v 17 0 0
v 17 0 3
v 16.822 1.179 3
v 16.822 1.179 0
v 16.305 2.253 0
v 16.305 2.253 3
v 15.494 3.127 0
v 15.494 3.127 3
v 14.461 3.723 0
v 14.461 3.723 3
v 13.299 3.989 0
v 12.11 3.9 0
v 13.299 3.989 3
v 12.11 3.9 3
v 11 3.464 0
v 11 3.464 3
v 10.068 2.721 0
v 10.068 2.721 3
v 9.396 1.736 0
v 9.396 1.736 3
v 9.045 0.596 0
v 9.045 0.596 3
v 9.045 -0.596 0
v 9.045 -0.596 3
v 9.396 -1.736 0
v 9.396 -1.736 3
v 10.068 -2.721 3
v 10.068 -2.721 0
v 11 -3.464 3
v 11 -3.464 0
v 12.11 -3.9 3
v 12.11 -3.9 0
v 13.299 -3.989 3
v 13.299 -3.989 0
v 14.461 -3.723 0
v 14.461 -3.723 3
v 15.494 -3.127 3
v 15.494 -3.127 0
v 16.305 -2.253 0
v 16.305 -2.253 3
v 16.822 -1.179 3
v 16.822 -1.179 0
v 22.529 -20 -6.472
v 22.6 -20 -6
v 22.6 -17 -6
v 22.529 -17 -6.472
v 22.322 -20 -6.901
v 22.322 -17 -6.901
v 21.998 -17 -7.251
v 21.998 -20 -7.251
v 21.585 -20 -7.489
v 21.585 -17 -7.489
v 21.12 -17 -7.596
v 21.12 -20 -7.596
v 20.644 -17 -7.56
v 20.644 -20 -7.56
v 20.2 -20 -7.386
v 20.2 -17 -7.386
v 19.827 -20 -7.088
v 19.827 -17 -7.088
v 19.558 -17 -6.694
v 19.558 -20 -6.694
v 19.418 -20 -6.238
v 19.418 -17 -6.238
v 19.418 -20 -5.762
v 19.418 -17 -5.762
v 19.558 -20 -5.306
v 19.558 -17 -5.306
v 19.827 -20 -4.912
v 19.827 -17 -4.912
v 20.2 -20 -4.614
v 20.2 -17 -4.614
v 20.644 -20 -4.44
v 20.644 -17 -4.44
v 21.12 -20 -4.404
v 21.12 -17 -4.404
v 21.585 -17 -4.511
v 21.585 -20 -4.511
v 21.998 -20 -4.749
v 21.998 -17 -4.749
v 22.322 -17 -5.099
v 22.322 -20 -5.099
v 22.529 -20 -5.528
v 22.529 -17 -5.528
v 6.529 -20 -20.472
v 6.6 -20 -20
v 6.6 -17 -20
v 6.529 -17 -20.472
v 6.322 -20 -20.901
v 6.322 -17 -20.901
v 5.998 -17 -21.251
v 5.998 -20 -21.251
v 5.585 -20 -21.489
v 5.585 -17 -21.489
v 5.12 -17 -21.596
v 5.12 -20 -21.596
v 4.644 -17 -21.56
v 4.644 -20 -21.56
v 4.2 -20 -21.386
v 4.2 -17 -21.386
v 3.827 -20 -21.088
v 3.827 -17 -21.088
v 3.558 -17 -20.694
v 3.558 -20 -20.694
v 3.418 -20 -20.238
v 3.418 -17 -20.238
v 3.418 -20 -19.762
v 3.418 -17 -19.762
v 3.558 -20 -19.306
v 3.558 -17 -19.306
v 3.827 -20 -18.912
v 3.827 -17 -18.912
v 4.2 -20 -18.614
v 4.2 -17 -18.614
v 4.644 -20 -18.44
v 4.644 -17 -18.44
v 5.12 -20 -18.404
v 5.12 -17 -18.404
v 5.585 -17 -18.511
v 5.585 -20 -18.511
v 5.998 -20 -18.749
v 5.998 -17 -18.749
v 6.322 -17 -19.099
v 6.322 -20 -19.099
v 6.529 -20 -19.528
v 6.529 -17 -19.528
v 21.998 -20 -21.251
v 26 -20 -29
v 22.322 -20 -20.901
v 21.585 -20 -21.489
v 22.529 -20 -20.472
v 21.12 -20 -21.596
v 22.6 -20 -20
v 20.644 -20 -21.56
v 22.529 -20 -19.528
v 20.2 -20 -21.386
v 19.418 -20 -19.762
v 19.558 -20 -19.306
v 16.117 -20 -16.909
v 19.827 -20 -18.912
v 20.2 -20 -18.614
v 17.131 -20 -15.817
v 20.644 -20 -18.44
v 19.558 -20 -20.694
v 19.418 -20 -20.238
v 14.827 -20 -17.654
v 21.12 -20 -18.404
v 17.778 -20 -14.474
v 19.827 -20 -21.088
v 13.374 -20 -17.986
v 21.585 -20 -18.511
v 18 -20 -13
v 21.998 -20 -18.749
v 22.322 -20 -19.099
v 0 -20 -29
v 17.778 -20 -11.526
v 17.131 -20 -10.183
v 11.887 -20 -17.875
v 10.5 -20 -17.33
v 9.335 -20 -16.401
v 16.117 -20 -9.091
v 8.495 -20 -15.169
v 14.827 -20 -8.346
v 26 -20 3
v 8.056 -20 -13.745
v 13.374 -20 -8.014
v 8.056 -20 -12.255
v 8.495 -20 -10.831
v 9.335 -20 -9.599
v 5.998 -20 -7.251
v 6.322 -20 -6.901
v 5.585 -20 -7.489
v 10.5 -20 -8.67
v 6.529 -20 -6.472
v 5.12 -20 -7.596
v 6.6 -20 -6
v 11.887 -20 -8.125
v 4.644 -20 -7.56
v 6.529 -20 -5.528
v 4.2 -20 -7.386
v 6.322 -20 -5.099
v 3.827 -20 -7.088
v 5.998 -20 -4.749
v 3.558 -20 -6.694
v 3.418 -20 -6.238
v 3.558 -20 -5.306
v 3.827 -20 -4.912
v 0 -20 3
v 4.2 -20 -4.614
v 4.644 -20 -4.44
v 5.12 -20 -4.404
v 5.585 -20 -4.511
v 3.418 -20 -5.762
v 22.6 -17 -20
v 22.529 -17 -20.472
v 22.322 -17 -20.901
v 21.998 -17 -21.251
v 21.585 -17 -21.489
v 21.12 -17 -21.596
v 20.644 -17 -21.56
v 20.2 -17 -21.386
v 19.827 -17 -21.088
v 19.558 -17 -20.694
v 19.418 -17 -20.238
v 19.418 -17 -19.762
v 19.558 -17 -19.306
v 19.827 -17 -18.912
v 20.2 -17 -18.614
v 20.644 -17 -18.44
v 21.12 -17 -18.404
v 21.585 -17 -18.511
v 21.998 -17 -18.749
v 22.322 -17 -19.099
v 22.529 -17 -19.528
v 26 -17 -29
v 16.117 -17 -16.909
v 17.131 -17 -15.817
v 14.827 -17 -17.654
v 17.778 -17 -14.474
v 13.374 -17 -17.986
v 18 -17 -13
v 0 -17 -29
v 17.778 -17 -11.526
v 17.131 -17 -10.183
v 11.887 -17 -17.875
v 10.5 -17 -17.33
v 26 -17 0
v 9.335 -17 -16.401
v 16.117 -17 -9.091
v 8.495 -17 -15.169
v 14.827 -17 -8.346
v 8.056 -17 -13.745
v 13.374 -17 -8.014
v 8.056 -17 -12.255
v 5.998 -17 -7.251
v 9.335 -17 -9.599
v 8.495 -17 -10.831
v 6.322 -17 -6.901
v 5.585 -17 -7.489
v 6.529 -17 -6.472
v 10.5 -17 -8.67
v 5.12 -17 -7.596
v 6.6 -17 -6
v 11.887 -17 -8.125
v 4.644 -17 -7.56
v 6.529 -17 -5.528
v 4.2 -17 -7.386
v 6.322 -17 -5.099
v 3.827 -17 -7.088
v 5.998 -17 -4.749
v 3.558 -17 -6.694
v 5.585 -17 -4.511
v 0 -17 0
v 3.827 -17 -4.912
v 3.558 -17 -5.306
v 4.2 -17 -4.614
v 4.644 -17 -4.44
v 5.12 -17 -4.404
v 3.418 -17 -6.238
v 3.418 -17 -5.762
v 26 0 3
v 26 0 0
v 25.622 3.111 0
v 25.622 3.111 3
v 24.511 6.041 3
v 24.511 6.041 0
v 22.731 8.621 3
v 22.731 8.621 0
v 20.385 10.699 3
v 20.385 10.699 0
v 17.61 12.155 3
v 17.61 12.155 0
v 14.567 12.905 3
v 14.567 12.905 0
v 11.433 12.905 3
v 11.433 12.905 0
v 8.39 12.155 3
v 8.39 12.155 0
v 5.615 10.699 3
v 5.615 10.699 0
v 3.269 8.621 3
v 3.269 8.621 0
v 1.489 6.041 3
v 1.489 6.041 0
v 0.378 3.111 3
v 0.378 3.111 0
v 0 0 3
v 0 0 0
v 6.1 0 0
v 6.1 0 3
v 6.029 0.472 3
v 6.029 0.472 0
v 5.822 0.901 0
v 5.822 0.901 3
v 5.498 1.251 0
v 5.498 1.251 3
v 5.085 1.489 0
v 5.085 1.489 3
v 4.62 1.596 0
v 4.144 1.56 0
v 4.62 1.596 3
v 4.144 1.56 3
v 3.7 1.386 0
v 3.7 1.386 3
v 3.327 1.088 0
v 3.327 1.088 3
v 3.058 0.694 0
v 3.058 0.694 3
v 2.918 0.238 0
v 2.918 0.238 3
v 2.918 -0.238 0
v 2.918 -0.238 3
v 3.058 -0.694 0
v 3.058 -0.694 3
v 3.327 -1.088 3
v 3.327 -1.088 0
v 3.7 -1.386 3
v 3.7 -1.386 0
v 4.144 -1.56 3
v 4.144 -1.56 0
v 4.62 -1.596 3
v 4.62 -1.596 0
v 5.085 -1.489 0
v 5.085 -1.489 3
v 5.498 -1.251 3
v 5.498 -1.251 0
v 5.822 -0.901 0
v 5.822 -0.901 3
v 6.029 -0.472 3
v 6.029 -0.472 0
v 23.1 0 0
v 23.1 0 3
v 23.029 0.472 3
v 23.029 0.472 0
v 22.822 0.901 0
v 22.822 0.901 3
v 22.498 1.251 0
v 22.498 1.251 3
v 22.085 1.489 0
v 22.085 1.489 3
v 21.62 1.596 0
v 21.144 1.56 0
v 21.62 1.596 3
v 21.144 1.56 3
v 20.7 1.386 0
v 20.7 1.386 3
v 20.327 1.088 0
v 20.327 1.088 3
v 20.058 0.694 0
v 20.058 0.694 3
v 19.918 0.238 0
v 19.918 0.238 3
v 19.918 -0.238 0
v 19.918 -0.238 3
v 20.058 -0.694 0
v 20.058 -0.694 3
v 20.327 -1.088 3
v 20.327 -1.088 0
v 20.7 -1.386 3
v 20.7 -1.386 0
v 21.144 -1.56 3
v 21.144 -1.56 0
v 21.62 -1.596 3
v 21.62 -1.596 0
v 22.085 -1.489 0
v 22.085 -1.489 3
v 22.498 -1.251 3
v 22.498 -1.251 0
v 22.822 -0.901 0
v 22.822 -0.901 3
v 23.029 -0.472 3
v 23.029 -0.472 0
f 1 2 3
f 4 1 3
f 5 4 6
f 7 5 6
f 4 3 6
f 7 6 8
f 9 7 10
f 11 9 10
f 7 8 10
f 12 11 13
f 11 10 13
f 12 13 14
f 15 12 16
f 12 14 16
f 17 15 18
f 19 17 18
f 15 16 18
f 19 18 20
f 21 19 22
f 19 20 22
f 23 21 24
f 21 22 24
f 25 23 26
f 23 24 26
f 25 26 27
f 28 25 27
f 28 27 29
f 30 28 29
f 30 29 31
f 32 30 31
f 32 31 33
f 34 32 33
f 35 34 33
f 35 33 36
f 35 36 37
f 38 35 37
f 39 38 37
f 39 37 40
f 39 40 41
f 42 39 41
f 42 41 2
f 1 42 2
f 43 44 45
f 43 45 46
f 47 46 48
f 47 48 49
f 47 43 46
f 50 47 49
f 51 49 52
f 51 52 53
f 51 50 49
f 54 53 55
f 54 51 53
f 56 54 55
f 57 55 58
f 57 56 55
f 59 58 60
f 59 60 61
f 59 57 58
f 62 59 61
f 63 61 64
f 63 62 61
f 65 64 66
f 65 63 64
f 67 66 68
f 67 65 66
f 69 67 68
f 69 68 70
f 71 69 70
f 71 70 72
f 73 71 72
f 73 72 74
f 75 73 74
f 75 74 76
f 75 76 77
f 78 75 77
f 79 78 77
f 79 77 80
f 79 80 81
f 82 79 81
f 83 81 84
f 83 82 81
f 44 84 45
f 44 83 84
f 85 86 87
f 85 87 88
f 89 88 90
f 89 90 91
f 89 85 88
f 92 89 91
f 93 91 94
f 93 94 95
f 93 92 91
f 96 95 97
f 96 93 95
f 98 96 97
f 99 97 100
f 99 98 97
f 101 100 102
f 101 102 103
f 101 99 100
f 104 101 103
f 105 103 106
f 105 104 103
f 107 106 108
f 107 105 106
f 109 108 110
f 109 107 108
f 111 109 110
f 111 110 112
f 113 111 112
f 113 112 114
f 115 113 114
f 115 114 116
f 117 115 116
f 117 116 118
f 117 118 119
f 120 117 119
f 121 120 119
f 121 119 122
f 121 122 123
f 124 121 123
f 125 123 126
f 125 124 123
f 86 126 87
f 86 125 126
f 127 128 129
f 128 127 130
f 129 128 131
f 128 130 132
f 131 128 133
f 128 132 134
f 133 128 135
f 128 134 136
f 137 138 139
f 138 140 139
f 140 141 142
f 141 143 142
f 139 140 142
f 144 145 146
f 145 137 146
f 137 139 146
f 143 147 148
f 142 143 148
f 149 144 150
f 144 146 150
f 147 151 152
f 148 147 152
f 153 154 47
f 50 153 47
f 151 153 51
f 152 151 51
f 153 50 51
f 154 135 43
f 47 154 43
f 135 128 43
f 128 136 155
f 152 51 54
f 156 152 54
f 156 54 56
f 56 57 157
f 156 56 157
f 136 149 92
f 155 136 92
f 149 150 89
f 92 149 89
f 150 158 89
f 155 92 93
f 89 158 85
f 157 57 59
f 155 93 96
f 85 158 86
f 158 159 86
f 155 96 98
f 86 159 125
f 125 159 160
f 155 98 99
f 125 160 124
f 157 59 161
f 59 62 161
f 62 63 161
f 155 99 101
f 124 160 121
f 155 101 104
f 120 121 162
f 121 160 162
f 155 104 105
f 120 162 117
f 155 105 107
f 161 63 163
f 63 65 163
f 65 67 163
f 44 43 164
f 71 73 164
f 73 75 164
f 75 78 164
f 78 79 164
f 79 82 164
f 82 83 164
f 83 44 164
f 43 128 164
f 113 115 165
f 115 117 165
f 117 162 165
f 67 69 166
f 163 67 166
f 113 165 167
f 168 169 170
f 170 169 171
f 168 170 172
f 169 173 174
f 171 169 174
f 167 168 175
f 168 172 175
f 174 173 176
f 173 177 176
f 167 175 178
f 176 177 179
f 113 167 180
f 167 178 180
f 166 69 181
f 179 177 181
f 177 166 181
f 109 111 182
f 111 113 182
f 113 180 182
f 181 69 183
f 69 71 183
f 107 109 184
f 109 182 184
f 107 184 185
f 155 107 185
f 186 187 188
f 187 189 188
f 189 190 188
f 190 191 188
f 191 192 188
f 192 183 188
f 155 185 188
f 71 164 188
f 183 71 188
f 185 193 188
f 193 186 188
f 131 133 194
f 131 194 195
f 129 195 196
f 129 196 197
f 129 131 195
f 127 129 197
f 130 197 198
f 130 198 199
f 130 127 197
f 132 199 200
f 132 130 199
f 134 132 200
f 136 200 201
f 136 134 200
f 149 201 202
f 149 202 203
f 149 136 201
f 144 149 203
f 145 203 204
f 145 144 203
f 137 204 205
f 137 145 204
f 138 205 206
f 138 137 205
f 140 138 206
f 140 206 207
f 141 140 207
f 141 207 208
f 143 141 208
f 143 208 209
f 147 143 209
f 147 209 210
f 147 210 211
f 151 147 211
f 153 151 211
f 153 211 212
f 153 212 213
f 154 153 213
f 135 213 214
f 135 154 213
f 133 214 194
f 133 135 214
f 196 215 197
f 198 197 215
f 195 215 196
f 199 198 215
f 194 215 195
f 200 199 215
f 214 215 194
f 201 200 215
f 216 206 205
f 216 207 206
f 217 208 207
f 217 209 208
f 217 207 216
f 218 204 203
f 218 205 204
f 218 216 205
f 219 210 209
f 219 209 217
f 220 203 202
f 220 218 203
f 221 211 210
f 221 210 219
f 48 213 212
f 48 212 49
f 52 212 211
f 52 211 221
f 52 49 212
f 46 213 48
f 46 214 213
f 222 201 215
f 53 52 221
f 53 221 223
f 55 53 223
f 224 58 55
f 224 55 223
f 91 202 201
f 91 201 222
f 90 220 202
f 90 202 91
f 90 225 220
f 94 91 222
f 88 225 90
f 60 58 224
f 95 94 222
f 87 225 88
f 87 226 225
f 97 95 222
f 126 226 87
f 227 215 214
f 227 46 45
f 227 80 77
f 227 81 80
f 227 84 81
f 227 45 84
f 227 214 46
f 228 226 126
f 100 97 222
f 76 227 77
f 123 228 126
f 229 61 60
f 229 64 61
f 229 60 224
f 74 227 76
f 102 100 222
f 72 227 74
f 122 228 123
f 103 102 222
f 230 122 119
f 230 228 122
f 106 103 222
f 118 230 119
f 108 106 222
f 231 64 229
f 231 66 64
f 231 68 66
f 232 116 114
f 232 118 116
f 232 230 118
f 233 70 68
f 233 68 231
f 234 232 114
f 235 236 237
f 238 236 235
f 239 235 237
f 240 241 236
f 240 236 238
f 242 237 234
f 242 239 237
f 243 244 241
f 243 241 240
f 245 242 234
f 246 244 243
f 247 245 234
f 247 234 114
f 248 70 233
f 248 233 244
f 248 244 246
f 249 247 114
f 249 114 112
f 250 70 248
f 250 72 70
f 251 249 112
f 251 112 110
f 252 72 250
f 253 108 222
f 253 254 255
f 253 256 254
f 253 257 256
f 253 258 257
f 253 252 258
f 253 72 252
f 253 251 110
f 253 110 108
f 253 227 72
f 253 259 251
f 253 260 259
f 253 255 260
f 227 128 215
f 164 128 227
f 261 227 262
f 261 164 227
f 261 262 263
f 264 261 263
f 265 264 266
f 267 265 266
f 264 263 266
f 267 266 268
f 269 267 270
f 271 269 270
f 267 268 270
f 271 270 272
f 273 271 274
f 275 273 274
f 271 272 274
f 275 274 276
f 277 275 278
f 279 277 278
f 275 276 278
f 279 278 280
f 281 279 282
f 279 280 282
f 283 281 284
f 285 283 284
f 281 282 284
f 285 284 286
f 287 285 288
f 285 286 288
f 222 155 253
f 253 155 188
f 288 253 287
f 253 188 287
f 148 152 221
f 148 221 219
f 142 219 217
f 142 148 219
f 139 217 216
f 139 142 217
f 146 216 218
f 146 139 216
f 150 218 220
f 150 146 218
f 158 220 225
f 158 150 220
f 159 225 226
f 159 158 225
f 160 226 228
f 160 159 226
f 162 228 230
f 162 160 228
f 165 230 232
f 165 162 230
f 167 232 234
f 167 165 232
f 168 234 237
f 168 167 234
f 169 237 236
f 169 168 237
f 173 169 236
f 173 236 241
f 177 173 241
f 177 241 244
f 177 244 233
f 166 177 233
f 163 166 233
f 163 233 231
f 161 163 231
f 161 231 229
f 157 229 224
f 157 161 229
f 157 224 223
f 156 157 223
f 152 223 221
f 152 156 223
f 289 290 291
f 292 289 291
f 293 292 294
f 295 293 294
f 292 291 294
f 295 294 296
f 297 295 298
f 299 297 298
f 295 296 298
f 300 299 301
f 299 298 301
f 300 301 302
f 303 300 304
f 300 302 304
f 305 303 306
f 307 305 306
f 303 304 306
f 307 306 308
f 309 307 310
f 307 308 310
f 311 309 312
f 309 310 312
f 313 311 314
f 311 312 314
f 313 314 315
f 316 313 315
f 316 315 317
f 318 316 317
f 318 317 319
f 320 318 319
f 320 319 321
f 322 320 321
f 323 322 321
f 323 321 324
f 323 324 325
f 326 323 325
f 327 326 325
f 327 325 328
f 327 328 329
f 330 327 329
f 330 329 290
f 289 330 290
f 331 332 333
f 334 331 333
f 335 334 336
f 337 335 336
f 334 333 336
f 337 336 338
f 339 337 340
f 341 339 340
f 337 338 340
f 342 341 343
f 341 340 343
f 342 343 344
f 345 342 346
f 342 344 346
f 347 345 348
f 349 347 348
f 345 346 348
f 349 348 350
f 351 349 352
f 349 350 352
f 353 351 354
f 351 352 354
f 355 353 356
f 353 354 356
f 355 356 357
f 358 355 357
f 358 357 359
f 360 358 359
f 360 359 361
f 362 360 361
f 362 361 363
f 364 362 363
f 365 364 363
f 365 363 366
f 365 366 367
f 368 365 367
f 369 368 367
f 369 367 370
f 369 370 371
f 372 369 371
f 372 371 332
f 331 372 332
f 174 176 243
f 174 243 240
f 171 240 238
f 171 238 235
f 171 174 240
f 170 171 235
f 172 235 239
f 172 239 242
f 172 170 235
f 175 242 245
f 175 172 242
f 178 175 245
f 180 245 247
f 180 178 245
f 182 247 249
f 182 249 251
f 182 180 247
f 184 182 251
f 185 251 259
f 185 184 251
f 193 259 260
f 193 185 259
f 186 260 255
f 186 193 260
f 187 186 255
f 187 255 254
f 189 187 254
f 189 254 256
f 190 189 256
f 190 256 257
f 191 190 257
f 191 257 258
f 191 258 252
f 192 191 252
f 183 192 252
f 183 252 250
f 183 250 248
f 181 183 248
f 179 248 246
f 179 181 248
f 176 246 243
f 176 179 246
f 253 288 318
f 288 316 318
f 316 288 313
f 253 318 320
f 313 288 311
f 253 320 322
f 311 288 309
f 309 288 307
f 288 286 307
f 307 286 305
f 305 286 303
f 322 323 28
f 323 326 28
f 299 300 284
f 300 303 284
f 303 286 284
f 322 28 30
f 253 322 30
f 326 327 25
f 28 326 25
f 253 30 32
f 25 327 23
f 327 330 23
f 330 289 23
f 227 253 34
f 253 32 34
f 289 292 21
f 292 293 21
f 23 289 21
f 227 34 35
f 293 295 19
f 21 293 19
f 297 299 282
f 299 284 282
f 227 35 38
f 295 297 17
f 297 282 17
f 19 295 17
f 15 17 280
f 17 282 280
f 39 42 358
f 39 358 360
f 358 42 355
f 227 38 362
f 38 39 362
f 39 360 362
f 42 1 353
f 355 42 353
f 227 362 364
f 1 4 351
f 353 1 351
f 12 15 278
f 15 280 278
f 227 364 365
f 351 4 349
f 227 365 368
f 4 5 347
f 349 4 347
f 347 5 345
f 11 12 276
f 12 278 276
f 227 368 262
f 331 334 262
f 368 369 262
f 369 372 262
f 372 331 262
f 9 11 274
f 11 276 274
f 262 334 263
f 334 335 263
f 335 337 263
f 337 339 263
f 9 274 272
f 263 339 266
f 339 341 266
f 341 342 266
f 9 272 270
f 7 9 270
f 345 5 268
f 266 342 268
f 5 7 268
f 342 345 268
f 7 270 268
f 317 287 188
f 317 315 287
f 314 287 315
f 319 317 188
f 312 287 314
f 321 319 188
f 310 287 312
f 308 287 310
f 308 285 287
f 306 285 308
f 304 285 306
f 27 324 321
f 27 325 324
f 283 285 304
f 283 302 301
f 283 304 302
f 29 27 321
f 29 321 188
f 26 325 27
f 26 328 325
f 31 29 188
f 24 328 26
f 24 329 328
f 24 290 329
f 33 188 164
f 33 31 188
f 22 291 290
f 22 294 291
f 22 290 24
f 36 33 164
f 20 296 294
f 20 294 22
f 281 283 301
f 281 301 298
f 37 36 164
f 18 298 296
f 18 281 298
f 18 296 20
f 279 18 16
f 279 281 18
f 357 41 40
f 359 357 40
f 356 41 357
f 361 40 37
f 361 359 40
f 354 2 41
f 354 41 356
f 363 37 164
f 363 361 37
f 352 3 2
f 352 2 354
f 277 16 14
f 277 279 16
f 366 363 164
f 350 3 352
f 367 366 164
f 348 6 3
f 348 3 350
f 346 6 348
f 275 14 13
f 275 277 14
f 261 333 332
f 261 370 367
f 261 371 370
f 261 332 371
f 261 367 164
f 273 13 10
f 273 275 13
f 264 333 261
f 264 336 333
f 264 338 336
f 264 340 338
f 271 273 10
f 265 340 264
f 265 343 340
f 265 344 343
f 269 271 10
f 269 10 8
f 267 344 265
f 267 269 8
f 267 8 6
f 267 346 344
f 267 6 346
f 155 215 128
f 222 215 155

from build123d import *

# Parameters (mm, degrees)
BOSS_EXTRUDE1_DEPTH      = 3
SKETCH2_R                = 4
SKETCH2_R_2              = 1.6
CUT_EXTRUDE1_DEPTH       = 13
SKETCH3_W                = 26
SKETCH3_H                = 3
BOSS_EXTRUDE2_DEPTH      = 29
CUT_EXTRUDE3_START       = -20
CUT_EXTRUDE3_OUTLINE_R   = 1.6
CUT_EXTRUDE3_OUTLINE_R_2 = 5
CUT_EXTRUDE3_DEPTH       = 3


# Read off the part's stored shape, not the designer's step: Cut-Extrude3
with BuildPart() as part:
    # Sketch1 → Boss-Extrude1 (new body)
    with BuildSketch(Plane.XY):
        with BuildLine():
            Line((0, 0), (0, -20))
            Line((0, -20), (26, -20))
            Line((26, -20), (26, 0))
            ThreePointArc((26, 0), (13, 13), (0, 0))
        make_face()
    extrude(amount=BOSS_EXTRUDE1_DEPTH)

    # Sketch2 → Cut-Extrude1 (cut)
    with BuildSketch(Plane.XY.offset(3)):
        with Locations((13, 0)):
            Circle(SKETCH2_R)
        with Locations((4.5, 0)):
            Circle(SKETCH2_R_2)
        with Locations((21.5, 0)):
            Circle(SKETCH2_R_2)
    extrude(amount=-CUT_EXTRUDE1_DEPTH, mode=Mode.SUBTRACT)

    # Sketch3 → Boss-Extrude2 (add)
    with BuildSketch(Plane(origin=(0, 0, 0), x_dir=(-1, 0, 0), z_dir=(0, 0, -1))):
        with Locations((-13, -18.5)):
            Rectangle(SKETCH3_W, SKETCH3_H)
    extrude(amount=BOSS_EXTRUDE2_DEPTH)

    # Cut-Extrude3 outline → Cut-Extrude3 (cut)
    with BuildSketch(Plane(origin=(0, 0, 0), x_dir=(1, 0, 0), z_dir=(0, 1, 0)).offset(CUT_EXTRUDE3_START)):
        with Locations((5, 20)):
            Circle(CUT_EXTRUDE3_OUTLINE_R)
        with Locations((21, 6)):
            Circle(CUT_EXTRUDE3_OUTLINE_R)
        with Locations((21, 20)):
            Circle(CUT_EXTRUDE3_OUTLINE_R)
        with Locations((13, 13)):
            Circle(CUT_EXTRUDE3_OUTLINE_R_2)
        with Locations((5, 6)):
            Circle(CUT_EXTRUDE3_OUTLINE_R)
    extrude(amount=CUT_EXTRUDE3_DEPTH, mode=Mode.SUBTRACT)


solid = part.part
